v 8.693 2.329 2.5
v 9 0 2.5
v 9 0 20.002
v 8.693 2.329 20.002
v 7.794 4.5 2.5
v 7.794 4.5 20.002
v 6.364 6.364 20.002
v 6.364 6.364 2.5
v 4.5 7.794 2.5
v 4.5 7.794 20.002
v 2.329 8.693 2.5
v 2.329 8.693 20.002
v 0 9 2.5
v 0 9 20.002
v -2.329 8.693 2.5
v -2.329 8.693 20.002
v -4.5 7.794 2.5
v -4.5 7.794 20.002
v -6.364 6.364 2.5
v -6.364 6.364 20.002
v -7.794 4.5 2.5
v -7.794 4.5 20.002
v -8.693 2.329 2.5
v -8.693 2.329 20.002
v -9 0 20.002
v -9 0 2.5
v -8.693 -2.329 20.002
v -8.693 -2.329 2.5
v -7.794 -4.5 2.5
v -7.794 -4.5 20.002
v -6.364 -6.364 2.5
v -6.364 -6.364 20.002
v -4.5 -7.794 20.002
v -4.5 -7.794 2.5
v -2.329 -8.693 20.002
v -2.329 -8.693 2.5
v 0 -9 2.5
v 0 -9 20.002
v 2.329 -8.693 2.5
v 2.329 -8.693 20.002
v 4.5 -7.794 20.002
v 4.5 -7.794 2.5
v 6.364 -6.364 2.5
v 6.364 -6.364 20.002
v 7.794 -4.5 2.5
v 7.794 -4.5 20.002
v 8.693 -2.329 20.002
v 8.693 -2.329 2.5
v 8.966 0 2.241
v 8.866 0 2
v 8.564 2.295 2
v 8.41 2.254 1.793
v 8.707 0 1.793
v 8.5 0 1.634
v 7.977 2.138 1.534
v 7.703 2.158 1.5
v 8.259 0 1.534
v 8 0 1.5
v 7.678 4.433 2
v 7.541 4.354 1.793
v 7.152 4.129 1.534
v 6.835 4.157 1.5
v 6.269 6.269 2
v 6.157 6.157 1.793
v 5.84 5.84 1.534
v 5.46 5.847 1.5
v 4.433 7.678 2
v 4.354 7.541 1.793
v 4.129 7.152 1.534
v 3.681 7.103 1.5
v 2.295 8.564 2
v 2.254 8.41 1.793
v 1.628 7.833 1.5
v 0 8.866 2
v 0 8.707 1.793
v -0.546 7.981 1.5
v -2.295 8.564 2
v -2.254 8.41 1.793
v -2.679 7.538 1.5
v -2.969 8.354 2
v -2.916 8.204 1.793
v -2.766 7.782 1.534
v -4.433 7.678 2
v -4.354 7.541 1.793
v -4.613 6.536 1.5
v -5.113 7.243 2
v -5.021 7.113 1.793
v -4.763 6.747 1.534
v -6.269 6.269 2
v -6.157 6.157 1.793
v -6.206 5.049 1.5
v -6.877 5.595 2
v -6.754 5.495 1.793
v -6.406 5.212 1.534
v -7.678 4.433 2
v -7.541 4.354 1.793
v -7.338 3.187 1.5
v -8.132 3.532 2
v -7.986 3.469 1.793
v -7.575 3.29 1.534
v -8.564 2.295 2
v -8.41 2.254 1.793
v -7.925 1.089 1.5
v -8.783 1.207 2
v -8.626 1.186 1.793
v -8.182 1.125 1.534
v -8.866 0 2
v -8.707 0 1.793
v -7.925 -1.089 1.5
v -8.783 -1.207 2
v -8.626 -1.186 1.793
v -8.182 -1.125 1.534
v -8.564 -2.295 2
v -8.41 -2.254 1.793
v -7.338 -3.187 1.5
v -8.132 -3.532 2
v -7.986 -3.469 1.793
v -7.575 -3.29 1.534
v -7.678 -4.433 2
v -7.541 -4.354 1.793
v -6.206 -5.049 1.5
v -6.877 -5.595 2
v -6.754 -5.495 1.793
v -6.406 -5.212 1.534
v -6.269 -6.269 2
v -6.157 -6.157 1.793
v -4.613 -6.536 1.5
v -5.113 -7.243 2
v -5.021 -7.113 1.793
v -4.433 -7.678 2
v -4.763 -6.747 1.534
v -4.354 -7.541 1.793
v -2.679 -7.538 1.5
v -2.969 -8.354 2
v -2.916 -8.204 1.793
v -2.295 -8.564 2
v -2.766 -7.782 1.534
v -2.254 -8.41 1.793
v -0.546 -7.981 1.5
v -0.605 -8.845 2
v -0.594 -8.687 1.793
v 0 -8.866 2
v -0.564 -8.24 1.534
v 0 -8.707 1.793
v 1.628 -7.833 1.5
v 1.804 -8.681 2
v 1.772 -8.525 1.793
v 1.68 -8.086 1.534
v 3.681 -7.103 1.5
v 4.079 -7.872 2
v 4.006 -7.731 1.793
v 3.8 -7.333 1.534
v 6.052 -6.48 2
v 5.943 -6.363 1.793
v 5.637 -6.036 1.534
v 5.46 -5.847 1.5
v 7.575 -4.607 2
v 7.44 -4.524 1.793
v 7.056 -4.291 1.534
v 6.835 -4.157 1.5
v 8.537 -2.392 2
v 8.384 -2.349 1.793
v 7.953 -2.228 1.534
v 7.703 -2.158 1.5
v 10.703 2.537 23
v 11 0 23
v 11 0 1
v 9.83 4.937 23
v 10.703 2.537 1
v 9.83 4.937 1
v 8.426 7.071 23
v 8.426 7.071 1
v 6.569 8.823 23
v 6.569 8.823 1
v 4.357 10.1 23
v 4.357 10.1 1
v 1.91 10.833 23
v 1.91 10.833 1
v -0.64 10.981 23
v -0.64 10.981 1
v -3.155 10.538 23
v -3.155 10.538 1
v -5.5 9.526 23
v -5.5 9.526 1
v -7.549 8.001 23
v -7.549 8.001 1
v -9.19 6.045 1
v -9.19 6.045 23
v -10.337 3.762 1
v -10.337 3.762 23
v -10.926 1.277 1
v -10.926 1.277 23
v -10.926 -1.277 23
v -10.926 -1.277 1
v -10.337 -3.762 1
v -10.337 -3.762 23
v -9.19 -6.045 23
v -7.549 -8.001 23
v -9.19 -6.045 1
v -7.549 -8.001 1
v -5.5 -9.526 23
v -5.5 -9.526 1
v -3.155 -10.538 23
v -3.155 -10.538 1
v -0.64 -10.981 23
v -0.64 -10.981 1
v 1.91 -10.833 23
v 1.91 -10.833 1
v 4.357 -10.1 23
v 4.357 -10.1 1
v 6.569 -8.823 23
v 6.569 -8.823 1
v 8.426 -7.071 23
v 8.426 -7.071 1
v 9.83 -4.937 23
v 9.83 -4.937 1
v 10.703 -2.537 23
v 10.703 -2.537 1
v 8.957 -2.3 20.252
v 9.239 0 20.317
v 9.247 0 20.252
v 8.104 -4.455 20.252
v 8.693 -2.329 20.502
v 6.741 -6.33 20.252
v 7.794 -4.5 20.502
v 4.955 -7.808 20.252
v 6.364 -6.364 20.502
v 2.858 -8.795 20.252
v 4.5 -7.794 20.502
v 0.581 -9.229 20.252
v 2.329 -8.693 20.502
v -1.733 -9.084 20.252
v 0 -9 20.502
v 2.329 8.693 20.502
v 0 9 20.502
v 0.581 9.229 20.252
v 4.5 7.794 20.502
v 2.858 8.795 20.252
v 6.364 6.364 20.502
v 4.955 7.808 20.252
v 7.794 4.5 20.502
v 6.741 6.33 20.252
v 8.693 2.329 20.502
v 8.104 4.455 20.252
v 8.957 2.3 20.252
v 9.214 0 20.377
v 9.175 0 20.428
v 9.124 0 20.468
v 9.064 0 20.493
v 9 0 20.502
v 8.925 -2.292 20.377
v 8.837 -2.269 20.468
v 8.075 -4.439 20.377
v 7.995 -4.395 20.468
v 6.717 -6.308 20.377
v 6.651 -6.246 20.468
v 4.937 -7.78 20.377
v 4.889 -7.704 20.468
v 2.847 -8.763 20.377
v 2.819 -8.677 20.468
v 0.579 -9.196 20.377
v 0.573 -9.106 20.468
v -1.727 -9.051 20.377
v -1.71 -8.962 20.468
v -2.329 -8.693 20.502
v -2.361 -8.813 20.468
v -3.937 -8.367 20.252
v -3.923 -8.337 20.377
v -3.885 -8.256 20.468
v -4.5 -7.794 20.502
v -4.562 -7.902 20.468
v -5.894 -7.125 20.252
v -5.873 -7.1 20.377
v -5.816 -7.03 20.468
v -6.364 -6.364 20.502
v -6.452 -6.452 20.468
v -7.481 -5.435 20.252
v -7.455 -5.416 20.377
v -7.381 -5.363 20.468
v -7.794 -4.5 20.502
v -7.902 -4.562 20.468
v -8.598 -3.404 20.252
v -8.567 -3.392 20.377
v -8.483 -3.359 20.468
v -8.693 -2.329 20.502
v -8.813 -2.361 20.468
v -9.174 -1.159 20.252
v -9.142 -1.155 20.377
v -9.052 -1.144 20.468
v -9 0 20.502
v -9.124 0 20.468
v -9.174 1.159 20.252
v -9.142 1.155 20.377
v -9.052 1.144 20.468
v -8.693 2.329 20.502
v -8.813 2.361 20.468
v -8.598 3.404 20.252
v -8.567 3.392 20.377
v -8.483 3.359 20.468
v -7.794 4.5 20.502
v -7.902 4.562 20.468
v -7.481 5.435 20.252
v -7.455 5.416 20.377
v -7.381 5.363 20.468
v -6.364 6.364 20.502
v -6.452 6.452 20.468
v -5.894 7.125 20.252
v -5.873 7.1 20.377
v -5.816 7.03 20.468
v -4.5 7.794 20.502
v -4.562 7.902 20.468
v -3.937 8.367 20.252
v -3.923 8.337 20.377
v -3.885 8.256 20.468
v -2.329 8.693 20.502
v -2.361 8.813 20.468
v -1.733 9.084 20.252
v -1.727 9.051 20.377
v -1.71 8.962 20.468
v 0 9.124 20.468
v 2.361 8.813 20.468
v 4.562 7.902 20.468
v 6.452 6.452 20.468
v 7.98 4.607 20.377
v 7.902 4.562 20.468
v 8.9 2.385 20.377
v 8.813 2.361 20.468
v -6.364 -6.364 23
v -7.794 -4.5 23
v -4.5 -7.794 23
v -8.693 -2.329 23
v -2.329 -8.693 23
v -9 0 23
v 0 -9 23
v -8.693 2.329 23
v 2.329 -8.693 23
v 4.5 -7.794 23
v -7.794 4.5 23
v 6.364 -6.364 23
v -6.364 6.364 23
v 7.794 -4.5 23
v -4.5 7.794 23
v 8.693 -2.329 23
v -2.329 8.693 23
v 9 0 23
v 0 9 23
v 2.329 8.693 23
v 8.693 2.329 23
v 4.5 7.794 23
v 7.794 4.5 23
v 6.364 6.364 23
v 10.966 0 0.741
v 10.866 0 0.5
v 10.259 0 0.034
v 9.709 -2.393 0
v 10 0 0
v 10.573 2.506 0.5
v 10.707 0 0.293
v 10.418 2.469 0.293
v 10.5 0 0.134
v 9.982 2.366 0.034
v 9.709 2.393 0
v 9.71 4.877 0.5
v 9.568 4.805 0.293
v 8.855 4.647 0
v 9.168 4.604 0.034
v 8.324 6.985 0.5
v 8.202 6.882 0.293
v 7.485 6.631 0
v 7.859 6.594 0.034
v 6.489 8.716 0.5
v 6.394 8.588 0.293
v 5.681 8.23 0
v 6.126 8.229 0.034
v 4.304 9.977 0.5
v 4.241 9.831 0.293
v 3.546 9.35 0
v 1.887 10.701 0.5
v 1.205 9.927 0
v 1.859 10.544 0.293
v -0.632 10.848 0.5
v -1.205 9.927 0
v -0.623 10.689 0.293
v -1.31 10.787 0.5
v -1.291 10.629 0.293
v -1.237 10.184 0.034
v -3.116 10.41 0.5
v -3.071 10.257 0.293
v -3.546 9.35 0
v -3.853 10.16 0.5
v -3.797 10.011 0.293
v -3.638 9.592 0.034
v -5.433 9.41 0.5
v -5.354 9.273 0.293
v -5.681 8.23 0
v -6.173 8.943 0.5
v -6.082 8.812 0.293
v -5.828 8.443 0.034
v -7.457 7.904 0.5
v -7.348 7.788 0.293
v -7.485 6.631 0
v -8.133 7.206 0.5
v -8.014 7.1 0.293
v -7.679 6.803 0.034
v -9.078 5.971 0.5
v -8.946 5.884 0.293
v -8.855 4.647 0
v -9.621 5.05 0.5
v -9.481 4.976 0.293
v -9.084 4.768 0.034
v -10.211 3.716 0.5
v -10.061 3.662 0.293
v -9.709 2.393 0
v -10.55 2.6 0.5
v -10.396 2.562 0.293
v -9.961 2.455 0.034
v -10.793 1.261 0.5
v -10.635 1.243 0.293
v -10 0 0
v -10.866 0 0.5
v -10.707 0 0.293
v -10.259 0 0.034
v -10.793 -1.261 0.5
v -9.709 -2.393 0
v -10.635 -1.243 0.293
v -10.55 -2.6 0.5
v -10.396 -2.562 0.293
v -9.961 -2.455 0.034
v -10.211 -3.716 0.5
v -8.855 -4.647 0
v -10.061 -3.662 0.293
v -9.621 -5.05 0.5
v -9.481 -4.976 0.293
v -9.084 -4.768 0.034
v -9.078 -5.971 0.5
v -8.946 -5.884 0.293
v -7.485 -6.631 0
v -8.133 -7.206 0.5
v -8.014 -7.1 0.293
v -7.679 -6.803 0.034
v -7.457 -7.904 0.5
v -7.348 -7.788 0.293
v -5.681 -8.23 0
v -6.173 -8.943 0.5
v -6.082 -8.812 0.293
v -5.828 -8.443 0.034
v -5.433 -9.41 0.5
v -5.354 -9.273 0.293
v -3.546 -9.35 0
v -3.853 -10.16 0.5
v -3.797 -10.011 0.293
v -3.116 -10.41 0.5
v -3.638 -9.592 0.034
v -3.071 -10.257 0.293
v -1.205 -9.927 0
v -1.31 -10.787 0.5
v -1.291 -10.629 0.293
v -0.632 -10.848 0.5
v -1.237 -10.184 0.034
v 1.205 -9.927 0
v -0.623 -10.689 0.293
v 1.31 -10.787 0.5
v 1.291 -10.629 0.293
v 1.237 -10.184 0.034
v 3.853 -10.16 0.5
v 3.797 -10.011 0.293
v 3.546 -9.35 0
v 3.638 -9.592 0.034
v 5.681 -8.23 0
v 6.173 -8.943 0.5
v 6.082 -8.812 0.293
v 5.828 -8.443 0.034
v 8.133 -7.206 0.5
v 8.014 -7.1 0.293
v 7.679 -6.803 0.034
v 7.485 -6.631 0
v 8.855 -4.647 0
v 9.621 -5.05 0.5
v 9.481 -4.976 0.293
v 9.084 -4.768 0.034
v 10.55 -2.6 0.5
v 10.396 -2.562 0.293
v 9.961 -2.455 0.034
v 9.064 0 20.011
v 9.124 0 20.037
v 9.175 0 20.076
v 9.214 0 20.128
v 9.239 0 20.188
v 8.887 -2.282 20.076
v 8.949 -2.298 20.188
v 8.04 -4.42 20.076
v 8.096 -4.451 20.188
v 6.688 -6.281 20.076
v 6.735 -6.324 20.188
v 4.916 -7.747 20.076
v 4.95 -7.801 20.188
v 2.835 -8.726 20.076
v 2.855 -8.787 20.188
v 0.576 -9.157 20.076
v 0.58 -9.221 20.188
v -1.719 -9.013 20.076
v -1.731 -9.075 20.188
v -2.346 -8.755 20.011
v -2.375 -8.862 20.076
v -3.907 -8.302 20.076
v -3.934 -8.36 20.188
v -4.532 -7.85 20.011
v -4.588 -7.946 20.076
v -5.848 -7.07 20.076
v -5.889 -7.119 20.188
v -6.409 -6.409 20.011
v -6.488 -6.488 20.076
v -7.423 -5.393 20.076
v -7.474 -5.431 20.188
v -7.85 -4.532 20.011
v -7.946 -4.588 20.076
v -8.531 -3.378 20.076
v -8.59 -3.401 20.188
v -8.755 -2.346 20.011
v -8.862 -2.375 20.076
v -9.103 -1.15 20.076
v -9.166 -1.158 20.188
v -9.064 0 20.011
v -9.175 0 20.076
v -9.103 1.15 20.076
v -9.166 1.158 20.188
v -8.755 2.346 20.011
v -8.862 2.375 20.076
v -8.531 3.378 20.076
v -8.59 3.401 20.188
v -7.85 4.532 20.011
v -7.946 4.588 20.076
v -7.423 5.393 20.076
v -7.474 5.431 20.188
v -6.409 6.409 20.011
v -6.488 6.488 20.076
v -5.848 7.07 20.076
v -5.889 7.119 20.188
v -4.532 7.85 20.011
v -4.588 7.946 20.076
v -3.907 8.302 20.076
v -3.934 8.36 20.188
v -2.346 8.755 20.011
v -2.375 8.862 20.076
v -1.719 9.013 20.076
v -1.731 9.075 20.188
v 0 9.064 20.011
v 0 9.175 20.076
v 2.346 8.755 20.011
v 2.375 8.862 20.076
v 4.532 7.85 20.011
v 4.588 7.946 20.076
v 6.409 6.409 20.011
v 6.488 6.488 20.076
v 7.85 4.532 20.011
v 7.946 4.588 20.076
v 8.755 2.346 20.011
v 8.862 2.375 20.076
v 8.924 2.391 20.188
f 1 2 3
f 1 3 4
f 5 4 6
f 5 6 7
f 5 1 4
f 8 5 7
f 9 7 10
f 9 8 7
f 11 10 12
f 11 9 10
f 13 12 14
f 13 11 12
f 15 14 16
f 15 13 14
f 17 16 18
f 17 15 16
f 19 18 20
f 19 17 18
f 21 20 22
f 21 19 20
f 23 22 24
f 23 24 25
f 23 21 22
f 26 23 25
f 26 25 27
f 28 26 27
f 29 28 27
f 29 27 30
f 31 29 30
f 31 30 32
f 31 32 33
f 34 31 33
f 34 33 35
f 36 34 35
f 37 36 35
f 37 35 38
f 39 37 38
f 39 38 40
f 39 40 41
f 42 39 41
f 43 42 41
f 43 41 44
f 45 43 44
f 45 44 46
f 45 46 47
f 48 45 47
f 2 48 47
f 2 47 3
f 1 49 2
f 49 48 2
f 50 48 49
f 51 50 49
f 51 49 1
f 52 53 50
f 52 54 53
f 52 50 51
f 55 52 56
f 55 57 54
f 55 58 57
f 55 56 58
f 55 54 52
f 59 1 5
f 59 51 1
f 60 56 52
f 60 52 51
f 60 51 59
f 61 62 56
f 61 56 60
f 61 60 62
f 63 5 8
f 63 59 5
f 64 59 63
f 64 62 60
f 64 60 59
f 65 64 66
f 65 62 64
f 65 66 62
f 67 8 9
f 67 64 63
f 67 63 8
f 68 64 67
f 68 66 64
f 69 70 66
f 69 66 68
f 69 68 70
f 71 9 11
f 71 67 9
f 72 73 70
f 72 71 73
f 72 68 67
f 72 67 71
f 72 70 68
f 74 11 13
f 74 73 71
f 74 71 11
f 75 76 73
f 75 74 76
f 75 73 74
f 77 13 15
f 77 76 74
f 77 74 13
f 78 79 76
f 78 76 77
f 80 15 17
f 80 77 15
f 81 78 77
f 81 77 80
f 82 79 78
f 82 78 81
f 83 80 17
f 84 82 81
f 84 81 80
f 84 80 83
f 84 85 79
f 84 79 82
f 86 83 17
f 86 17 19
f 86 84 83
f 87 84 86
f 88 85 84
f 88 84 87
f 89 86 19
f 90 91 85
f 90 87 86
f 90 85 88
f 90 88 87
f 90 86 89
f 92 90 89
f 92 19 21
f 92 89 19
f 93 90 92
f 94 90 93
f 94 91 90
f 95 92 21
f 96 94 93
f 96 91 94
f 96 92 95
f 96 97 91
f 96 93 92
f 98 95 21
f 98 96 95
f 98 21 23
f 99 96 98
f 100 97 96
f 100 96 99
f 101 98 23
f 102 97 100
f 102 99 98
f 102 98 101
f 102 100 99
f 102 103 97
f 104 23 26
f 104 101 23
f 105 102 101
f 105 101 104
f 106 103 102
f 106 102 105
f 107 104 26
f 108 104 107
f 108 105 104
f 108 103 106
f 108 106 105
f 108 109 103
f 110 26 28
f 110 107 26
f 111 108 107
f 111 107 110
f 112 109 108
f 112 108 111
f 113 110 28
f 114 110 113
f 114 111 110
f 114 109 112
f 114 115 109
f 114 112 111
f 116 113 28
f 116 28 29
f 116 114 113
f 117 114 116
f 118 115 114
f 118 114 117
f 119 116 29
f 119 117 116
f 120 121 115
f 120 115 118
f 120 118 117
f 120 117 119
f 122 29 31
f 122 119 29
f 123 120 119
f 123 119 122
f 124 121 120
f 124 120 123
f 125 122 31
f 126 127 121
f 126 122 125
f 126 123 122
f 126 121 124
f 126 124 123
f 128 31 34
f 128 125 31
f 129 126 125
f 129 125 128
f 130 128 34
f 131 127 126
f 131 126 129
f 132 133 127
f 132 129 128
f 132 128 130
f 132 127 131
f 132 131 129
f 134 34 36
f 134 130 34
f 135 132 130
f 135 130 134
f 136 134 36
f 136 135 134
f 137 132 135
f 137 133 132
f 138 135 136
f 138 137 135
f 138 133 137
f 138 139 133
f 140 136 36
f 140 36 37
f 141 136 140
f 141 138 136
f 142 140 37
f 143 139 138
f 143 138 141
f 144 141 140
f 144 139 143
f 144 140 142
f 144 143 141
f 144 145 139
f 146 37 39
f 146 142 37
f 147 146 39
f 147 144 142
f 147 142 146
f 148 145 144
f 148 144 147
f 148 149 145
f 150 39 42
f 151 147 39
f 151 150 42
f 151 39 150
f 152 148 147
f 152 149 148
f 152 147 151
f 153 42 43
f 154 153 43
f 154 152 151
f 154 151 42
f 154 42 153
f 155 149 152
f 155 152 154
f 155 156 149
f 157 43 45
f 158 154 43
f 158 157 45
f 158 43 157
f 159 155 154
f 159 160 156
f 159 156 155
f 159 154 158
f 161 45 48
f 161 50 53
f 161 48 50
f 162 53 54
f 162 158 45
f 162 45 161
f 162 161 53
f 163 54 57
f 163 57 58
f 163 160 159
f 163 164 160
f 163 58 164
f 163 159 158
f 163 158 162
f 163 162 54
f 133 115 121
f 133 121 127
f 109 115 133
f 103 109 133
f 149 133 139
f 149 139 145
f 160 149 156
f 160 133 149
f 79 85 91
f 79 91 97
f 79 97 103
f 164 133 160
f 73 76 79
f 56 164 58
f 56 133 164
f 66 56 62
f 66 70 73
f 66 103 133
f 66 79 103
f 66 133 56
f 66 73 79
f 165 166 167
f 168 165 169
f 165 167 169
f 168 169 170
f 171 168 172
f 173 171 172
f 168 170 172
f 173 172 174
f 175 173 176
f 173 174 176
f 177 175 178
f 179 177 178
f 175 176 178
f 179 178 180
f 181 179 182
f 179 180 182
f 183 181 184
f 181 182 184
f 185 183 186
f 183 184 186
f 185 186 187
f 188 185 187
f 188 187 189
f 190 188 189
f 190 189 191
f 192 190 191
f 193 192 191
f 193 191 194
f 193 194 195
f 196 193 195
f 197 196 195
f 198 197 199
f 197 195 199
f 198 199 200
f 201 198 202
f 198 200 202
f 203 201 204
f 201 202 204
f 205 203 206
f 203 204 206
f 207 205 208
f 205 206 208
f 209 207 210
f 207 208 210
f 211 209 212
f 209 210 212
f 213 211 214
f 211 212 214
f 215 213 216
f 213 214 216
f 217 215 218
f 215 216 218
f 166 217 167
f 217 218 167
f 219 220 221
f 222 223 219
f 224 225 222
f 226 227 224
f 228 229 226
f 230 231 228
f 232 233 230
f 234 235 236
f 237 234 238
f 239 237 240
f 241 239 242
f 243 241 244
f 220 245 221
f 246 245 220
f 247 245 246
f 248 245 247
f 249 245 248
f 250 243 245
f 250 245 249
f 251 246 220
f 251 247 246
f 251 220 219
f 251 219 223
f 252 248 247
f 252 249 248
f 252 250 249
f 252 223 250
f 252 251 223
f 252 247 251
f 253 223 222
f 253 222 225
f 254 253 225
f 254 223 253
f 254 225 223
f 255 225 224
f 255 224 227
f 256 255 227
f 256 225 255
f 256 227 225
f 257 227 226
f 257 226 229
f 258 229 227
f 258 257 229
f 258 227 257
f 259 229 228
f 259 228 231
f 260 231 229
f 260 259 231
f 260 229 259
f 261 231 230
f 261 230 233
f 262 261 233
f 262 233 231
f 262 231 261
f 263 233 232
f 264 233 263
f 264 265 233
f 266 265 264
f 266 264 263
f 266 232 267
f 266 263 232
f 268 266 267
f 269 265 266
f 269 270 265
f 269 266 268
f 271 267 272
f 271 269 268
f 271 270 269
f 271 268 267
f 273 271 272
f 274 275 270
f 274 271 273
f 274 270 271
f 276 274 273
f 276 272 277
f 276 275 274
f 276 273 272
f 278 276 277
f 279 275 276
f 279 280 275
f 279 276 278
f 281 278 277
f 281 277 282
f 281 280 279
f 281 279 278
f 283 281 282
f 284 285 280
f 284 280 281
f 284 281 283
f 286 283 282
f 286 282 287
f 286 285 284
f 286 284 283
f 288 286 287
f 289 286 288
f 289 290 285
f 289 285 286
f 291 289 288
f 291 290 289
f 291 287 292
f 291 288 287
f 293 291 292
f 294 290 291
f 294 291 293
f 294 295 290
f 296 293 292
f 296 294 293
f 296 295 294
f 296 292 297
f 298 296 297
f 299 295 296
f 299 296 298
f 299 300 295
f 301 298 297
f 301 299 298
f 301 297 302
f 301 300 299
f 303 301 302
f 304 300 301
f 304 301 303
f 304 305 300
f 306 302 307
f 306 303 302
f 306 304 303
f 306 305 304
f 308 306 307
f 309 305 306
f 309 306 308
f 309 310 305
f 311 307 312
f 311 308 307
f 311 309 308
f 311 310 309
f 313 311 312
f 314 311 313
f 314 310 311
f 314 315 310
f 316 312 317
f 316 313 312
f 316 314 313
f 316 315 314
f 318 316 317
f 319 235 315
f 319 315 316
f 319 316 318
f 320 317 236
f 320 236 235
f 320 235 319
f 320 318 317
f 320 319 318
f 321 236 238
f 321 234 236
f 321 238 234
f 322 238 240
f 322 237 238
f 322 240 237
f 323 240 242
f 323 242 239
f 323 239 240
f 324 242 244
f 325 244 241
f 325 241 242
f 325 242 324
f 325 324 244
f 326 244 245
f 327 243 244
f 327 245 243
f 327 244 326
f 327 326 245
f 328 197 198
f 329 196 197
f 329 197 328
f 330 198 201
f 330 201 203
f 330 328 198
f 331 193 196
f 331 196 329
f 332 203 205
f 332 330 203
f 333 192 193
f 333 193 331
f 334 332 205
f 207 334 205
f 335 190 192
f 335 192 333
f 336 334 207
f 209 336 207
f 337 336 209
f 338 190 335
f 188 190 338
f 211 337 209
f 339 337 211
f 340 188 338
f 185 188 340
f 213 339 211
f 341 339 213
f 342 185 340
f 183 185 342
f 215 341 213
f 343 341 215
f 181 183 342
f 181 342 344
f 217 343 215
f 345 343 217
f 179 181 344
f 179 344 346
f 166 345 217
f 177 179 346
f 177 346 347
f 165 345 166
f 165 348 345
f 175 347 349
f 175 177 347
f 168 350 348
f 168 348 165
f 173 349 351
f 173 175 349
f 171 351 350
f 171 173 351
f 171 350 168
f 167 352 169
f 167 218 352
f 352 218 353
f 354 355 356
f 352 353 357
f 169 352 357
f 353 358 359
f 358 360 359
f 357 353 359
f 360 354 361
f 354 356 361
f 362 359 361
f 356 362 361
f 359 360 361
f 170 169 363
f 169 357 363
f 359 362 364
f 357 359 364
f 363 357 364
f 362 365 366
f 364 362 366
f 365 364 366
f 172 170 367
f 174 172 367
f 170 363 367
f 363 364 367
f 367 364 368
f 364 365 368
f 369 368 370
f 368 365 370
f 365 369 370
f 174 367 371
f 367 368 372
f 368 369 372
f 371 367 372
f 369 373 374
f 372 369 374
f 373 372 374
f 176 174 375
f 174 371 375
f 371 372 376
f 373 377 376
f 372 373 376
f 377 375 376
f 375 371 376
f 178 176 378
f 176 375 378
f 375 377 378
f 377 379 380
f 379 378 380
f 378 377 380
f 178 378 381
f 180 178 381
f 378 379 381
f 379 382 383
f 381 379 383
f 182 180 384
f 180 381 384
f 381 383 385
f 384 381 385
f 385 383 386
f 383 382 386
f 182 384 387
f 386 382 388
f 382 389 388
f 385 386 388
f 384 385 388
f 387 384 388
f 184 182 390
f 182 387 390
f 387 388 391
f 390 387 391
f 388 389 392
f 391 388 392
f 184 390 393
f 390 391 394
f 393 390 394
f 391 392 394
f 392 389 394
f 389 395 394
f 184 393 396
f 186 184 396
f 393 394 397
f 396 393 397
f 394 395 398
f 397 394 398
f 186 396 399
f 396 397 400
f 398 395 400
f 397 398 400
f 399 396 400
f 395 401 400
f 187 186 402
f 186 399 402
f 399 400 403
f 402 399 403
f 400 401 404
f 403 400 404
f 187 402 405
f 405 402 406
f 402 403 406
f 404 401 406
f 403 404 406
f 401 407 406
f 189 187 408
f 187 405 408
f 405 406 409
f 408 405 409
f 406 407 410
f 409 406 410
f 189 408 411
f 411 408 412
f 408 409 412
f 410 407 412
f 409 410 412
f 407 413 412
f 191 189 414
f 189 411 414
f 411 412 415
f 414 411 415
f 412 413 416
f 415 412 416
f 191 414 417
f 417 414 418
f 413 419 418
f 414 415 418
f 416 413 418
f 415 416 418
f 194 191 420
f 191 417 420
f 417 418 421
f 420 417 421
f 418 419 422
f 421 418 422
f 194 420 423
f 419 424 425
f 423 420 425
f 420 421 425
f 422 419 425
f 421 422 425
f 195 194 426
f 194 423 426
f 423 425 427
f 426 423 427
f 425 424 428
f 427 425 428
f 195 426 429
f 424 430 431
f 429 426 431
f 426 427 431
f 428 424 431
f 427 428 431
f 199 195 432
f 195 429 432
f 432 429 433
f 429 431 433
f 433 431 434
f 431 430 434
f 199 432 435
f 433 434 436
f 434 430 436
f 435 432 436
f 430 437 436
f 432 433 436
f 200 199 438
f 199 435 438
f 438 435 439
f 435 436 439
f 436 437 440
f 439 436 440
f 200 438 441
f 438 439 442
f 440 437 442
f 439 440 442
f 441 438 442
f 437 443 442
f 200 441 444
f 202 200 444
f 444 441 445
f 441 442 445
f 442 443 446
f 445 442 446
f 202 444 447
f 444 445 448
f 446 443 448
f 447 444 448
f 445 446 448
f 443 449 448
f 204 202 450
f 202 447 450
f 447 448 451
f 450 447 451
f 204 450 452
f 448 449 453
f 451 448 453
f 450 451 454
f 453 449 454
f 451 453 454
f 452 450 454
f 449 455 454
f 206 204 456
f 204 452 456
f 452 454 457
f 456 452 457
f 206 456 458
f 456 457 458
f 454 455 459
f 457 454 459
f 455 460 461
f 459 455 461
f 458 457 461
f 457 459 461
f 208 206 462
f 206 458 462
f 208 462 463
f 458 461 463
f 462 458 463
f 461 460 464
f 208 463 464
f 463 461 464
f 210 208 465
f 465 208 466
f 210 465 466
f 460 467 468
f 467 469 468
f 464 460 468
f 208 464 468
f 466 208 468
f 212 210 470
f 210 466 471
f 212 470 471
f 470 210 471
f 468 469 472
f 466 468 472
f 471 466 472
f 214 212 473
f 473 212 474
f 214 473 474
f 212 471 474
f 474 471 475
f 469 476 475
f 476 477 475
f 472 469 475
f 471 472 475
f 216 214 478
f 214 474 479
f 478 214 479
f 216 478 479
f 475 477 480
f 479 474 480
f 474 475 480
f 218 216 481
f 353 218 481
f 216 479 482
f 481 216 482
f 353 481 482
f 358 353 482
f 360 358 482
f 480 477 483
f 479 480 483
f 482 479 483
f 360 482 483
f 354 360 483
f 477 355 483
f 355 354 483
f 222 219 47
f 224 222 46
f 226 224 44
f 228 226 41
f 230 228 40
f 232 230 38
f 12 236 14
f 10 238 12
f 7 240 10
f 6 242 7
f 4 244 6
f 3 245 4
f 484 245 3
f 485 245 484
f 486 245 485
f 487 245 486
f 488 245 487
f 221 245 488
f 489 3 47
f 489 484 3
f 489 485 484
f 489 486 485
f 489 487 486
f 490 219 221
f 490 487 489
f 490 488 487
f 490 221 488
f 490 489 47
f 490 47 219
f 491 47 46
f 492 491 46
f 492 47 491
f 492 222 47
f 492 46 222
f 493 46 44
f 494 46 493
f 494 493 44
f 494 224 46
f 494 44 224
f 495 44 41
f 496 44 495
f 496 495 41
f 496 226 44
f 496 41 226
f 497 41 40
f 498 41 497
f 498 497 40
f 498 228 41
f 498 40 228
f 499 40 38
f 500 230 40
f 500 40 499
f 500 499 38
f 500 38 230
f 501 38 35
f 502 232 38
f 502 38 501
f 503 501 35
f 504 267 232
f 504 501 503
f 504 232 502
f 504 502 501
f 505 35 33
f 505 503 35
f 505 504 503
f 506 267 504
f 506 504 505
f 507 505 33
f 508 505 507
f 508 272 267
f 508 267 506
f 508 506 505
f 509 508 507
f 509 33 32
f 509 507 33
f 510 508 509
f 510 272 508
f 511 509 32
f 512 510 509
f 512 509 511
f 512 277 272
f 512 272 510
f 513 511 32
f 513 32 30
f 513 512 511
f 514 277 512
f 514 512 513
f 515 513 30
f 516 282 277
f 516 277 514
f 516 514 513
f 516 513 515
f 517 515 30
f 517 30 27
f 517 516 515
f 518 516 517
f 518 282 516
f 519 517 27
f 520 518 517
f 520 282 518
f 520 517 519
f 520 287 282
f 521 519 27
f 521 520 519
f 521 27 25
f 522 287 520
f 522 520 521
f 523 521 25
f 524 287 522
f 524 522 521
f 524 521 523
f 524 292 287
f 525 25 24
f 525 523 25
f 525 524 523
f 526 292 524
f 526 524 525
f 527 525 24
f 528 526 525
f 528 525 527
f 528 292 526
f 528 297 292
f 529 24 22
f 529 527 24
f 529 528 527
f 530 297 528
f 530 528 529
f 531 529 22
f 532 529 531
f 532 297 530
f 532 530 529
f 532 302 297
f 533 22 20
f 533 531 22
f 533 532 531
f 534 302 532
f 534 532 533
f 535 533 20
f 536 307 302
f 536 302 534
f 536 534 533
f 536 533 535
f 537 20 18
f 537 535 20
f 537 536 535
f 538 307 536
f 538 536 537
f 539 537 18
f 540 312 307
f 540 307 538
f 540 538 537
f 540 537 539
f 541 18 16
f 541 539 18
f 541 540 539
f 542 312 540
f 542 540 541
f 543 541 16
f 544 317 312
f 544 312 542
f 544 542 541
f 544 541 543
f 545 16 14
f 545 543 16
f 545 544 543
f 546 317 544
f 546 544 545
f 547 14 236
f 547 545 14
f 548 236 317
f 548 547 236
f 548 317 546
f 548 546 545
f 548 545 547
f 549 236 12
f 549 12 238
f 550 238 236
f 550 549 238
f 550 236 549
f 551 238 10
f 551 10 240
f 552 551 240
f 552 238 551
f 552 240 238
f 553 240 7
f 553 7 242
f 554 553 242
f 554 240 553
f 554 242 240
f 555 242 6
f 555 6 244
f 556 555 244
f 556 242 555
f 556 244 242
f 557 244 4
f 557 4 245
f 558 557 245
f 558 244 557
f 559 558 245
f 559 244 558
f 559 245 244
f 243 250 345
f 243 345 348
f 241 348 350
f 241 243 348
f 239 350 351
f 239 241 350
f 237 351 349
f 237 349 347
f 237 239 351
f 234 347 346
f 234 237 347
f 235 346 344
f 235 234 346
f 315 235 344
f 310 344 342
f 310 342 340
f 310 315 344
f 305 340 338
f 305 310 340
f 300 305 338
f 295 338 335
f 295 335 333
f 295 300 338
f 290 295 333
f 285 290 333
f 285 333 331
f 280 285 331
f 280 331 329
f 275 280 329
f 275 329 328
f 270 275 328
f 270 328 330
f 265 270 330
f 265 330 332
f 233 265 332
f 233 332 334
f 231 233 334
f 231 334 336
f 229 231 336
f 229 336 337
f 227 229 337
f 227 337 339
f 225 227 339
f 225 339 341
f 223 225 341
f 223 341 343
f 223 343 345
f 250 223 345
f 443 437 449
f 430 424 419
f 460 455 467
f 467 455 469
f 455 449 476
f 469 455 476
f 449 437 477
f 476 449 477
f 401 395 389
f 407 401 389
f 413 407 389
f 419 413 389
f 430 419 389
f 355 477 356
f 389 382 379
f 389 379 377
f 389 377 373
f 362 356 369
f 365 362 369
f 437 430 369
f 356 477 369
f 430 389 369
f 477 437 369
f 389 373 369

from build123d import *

# Parameters (mm, degrees)
F0_R     = 9
F1_DEPTH = 1.5
F2_R     = 11
F2_R_2   = 9
F3_DEPTH = 23
F6_R     = 1


with BuildPart() as f1:
    # F0 (on Top) → F1 (new body)
    with BuildSketch(Plane.XY):
        Circle(F0_R)
    extrude(amount=F1_DEPTH)

    # F2 (on Top) → F3 (join)
    with BuildSketch(Plane.XY):
        Circle(F2_R)
        Circle(F2_R_2, mode=Mode.SUBTRACT)
    extrude(amount=F3_DEPTH)

    # F4 (on Front) → F5 (revolve, cut)
    with BuildSketch(Plane.XZ):
        with BuildLine():
            ThreePointArc((8.997346, 20.502327), (8.82057, 20.07555), (9.247346, 20.252327))
            ThreePointArc((9.247346, 20.252327), (9.174123, 20.429104), (8.997346, 20.502327))
        make_face()
    revolve(axis=Axis((0, 0, 0), (0, 0, -1)), mode=Mode.SUBTRACT)

    # F6
    f6_edges = [f1.edges().sort_by_distance(p)[0] for p in [
        (-9, 0, 1.5),
        (-11, 0, 0),
    ]]
    fillet(f6_edges, radius=F6_R)


solid = f1.part
